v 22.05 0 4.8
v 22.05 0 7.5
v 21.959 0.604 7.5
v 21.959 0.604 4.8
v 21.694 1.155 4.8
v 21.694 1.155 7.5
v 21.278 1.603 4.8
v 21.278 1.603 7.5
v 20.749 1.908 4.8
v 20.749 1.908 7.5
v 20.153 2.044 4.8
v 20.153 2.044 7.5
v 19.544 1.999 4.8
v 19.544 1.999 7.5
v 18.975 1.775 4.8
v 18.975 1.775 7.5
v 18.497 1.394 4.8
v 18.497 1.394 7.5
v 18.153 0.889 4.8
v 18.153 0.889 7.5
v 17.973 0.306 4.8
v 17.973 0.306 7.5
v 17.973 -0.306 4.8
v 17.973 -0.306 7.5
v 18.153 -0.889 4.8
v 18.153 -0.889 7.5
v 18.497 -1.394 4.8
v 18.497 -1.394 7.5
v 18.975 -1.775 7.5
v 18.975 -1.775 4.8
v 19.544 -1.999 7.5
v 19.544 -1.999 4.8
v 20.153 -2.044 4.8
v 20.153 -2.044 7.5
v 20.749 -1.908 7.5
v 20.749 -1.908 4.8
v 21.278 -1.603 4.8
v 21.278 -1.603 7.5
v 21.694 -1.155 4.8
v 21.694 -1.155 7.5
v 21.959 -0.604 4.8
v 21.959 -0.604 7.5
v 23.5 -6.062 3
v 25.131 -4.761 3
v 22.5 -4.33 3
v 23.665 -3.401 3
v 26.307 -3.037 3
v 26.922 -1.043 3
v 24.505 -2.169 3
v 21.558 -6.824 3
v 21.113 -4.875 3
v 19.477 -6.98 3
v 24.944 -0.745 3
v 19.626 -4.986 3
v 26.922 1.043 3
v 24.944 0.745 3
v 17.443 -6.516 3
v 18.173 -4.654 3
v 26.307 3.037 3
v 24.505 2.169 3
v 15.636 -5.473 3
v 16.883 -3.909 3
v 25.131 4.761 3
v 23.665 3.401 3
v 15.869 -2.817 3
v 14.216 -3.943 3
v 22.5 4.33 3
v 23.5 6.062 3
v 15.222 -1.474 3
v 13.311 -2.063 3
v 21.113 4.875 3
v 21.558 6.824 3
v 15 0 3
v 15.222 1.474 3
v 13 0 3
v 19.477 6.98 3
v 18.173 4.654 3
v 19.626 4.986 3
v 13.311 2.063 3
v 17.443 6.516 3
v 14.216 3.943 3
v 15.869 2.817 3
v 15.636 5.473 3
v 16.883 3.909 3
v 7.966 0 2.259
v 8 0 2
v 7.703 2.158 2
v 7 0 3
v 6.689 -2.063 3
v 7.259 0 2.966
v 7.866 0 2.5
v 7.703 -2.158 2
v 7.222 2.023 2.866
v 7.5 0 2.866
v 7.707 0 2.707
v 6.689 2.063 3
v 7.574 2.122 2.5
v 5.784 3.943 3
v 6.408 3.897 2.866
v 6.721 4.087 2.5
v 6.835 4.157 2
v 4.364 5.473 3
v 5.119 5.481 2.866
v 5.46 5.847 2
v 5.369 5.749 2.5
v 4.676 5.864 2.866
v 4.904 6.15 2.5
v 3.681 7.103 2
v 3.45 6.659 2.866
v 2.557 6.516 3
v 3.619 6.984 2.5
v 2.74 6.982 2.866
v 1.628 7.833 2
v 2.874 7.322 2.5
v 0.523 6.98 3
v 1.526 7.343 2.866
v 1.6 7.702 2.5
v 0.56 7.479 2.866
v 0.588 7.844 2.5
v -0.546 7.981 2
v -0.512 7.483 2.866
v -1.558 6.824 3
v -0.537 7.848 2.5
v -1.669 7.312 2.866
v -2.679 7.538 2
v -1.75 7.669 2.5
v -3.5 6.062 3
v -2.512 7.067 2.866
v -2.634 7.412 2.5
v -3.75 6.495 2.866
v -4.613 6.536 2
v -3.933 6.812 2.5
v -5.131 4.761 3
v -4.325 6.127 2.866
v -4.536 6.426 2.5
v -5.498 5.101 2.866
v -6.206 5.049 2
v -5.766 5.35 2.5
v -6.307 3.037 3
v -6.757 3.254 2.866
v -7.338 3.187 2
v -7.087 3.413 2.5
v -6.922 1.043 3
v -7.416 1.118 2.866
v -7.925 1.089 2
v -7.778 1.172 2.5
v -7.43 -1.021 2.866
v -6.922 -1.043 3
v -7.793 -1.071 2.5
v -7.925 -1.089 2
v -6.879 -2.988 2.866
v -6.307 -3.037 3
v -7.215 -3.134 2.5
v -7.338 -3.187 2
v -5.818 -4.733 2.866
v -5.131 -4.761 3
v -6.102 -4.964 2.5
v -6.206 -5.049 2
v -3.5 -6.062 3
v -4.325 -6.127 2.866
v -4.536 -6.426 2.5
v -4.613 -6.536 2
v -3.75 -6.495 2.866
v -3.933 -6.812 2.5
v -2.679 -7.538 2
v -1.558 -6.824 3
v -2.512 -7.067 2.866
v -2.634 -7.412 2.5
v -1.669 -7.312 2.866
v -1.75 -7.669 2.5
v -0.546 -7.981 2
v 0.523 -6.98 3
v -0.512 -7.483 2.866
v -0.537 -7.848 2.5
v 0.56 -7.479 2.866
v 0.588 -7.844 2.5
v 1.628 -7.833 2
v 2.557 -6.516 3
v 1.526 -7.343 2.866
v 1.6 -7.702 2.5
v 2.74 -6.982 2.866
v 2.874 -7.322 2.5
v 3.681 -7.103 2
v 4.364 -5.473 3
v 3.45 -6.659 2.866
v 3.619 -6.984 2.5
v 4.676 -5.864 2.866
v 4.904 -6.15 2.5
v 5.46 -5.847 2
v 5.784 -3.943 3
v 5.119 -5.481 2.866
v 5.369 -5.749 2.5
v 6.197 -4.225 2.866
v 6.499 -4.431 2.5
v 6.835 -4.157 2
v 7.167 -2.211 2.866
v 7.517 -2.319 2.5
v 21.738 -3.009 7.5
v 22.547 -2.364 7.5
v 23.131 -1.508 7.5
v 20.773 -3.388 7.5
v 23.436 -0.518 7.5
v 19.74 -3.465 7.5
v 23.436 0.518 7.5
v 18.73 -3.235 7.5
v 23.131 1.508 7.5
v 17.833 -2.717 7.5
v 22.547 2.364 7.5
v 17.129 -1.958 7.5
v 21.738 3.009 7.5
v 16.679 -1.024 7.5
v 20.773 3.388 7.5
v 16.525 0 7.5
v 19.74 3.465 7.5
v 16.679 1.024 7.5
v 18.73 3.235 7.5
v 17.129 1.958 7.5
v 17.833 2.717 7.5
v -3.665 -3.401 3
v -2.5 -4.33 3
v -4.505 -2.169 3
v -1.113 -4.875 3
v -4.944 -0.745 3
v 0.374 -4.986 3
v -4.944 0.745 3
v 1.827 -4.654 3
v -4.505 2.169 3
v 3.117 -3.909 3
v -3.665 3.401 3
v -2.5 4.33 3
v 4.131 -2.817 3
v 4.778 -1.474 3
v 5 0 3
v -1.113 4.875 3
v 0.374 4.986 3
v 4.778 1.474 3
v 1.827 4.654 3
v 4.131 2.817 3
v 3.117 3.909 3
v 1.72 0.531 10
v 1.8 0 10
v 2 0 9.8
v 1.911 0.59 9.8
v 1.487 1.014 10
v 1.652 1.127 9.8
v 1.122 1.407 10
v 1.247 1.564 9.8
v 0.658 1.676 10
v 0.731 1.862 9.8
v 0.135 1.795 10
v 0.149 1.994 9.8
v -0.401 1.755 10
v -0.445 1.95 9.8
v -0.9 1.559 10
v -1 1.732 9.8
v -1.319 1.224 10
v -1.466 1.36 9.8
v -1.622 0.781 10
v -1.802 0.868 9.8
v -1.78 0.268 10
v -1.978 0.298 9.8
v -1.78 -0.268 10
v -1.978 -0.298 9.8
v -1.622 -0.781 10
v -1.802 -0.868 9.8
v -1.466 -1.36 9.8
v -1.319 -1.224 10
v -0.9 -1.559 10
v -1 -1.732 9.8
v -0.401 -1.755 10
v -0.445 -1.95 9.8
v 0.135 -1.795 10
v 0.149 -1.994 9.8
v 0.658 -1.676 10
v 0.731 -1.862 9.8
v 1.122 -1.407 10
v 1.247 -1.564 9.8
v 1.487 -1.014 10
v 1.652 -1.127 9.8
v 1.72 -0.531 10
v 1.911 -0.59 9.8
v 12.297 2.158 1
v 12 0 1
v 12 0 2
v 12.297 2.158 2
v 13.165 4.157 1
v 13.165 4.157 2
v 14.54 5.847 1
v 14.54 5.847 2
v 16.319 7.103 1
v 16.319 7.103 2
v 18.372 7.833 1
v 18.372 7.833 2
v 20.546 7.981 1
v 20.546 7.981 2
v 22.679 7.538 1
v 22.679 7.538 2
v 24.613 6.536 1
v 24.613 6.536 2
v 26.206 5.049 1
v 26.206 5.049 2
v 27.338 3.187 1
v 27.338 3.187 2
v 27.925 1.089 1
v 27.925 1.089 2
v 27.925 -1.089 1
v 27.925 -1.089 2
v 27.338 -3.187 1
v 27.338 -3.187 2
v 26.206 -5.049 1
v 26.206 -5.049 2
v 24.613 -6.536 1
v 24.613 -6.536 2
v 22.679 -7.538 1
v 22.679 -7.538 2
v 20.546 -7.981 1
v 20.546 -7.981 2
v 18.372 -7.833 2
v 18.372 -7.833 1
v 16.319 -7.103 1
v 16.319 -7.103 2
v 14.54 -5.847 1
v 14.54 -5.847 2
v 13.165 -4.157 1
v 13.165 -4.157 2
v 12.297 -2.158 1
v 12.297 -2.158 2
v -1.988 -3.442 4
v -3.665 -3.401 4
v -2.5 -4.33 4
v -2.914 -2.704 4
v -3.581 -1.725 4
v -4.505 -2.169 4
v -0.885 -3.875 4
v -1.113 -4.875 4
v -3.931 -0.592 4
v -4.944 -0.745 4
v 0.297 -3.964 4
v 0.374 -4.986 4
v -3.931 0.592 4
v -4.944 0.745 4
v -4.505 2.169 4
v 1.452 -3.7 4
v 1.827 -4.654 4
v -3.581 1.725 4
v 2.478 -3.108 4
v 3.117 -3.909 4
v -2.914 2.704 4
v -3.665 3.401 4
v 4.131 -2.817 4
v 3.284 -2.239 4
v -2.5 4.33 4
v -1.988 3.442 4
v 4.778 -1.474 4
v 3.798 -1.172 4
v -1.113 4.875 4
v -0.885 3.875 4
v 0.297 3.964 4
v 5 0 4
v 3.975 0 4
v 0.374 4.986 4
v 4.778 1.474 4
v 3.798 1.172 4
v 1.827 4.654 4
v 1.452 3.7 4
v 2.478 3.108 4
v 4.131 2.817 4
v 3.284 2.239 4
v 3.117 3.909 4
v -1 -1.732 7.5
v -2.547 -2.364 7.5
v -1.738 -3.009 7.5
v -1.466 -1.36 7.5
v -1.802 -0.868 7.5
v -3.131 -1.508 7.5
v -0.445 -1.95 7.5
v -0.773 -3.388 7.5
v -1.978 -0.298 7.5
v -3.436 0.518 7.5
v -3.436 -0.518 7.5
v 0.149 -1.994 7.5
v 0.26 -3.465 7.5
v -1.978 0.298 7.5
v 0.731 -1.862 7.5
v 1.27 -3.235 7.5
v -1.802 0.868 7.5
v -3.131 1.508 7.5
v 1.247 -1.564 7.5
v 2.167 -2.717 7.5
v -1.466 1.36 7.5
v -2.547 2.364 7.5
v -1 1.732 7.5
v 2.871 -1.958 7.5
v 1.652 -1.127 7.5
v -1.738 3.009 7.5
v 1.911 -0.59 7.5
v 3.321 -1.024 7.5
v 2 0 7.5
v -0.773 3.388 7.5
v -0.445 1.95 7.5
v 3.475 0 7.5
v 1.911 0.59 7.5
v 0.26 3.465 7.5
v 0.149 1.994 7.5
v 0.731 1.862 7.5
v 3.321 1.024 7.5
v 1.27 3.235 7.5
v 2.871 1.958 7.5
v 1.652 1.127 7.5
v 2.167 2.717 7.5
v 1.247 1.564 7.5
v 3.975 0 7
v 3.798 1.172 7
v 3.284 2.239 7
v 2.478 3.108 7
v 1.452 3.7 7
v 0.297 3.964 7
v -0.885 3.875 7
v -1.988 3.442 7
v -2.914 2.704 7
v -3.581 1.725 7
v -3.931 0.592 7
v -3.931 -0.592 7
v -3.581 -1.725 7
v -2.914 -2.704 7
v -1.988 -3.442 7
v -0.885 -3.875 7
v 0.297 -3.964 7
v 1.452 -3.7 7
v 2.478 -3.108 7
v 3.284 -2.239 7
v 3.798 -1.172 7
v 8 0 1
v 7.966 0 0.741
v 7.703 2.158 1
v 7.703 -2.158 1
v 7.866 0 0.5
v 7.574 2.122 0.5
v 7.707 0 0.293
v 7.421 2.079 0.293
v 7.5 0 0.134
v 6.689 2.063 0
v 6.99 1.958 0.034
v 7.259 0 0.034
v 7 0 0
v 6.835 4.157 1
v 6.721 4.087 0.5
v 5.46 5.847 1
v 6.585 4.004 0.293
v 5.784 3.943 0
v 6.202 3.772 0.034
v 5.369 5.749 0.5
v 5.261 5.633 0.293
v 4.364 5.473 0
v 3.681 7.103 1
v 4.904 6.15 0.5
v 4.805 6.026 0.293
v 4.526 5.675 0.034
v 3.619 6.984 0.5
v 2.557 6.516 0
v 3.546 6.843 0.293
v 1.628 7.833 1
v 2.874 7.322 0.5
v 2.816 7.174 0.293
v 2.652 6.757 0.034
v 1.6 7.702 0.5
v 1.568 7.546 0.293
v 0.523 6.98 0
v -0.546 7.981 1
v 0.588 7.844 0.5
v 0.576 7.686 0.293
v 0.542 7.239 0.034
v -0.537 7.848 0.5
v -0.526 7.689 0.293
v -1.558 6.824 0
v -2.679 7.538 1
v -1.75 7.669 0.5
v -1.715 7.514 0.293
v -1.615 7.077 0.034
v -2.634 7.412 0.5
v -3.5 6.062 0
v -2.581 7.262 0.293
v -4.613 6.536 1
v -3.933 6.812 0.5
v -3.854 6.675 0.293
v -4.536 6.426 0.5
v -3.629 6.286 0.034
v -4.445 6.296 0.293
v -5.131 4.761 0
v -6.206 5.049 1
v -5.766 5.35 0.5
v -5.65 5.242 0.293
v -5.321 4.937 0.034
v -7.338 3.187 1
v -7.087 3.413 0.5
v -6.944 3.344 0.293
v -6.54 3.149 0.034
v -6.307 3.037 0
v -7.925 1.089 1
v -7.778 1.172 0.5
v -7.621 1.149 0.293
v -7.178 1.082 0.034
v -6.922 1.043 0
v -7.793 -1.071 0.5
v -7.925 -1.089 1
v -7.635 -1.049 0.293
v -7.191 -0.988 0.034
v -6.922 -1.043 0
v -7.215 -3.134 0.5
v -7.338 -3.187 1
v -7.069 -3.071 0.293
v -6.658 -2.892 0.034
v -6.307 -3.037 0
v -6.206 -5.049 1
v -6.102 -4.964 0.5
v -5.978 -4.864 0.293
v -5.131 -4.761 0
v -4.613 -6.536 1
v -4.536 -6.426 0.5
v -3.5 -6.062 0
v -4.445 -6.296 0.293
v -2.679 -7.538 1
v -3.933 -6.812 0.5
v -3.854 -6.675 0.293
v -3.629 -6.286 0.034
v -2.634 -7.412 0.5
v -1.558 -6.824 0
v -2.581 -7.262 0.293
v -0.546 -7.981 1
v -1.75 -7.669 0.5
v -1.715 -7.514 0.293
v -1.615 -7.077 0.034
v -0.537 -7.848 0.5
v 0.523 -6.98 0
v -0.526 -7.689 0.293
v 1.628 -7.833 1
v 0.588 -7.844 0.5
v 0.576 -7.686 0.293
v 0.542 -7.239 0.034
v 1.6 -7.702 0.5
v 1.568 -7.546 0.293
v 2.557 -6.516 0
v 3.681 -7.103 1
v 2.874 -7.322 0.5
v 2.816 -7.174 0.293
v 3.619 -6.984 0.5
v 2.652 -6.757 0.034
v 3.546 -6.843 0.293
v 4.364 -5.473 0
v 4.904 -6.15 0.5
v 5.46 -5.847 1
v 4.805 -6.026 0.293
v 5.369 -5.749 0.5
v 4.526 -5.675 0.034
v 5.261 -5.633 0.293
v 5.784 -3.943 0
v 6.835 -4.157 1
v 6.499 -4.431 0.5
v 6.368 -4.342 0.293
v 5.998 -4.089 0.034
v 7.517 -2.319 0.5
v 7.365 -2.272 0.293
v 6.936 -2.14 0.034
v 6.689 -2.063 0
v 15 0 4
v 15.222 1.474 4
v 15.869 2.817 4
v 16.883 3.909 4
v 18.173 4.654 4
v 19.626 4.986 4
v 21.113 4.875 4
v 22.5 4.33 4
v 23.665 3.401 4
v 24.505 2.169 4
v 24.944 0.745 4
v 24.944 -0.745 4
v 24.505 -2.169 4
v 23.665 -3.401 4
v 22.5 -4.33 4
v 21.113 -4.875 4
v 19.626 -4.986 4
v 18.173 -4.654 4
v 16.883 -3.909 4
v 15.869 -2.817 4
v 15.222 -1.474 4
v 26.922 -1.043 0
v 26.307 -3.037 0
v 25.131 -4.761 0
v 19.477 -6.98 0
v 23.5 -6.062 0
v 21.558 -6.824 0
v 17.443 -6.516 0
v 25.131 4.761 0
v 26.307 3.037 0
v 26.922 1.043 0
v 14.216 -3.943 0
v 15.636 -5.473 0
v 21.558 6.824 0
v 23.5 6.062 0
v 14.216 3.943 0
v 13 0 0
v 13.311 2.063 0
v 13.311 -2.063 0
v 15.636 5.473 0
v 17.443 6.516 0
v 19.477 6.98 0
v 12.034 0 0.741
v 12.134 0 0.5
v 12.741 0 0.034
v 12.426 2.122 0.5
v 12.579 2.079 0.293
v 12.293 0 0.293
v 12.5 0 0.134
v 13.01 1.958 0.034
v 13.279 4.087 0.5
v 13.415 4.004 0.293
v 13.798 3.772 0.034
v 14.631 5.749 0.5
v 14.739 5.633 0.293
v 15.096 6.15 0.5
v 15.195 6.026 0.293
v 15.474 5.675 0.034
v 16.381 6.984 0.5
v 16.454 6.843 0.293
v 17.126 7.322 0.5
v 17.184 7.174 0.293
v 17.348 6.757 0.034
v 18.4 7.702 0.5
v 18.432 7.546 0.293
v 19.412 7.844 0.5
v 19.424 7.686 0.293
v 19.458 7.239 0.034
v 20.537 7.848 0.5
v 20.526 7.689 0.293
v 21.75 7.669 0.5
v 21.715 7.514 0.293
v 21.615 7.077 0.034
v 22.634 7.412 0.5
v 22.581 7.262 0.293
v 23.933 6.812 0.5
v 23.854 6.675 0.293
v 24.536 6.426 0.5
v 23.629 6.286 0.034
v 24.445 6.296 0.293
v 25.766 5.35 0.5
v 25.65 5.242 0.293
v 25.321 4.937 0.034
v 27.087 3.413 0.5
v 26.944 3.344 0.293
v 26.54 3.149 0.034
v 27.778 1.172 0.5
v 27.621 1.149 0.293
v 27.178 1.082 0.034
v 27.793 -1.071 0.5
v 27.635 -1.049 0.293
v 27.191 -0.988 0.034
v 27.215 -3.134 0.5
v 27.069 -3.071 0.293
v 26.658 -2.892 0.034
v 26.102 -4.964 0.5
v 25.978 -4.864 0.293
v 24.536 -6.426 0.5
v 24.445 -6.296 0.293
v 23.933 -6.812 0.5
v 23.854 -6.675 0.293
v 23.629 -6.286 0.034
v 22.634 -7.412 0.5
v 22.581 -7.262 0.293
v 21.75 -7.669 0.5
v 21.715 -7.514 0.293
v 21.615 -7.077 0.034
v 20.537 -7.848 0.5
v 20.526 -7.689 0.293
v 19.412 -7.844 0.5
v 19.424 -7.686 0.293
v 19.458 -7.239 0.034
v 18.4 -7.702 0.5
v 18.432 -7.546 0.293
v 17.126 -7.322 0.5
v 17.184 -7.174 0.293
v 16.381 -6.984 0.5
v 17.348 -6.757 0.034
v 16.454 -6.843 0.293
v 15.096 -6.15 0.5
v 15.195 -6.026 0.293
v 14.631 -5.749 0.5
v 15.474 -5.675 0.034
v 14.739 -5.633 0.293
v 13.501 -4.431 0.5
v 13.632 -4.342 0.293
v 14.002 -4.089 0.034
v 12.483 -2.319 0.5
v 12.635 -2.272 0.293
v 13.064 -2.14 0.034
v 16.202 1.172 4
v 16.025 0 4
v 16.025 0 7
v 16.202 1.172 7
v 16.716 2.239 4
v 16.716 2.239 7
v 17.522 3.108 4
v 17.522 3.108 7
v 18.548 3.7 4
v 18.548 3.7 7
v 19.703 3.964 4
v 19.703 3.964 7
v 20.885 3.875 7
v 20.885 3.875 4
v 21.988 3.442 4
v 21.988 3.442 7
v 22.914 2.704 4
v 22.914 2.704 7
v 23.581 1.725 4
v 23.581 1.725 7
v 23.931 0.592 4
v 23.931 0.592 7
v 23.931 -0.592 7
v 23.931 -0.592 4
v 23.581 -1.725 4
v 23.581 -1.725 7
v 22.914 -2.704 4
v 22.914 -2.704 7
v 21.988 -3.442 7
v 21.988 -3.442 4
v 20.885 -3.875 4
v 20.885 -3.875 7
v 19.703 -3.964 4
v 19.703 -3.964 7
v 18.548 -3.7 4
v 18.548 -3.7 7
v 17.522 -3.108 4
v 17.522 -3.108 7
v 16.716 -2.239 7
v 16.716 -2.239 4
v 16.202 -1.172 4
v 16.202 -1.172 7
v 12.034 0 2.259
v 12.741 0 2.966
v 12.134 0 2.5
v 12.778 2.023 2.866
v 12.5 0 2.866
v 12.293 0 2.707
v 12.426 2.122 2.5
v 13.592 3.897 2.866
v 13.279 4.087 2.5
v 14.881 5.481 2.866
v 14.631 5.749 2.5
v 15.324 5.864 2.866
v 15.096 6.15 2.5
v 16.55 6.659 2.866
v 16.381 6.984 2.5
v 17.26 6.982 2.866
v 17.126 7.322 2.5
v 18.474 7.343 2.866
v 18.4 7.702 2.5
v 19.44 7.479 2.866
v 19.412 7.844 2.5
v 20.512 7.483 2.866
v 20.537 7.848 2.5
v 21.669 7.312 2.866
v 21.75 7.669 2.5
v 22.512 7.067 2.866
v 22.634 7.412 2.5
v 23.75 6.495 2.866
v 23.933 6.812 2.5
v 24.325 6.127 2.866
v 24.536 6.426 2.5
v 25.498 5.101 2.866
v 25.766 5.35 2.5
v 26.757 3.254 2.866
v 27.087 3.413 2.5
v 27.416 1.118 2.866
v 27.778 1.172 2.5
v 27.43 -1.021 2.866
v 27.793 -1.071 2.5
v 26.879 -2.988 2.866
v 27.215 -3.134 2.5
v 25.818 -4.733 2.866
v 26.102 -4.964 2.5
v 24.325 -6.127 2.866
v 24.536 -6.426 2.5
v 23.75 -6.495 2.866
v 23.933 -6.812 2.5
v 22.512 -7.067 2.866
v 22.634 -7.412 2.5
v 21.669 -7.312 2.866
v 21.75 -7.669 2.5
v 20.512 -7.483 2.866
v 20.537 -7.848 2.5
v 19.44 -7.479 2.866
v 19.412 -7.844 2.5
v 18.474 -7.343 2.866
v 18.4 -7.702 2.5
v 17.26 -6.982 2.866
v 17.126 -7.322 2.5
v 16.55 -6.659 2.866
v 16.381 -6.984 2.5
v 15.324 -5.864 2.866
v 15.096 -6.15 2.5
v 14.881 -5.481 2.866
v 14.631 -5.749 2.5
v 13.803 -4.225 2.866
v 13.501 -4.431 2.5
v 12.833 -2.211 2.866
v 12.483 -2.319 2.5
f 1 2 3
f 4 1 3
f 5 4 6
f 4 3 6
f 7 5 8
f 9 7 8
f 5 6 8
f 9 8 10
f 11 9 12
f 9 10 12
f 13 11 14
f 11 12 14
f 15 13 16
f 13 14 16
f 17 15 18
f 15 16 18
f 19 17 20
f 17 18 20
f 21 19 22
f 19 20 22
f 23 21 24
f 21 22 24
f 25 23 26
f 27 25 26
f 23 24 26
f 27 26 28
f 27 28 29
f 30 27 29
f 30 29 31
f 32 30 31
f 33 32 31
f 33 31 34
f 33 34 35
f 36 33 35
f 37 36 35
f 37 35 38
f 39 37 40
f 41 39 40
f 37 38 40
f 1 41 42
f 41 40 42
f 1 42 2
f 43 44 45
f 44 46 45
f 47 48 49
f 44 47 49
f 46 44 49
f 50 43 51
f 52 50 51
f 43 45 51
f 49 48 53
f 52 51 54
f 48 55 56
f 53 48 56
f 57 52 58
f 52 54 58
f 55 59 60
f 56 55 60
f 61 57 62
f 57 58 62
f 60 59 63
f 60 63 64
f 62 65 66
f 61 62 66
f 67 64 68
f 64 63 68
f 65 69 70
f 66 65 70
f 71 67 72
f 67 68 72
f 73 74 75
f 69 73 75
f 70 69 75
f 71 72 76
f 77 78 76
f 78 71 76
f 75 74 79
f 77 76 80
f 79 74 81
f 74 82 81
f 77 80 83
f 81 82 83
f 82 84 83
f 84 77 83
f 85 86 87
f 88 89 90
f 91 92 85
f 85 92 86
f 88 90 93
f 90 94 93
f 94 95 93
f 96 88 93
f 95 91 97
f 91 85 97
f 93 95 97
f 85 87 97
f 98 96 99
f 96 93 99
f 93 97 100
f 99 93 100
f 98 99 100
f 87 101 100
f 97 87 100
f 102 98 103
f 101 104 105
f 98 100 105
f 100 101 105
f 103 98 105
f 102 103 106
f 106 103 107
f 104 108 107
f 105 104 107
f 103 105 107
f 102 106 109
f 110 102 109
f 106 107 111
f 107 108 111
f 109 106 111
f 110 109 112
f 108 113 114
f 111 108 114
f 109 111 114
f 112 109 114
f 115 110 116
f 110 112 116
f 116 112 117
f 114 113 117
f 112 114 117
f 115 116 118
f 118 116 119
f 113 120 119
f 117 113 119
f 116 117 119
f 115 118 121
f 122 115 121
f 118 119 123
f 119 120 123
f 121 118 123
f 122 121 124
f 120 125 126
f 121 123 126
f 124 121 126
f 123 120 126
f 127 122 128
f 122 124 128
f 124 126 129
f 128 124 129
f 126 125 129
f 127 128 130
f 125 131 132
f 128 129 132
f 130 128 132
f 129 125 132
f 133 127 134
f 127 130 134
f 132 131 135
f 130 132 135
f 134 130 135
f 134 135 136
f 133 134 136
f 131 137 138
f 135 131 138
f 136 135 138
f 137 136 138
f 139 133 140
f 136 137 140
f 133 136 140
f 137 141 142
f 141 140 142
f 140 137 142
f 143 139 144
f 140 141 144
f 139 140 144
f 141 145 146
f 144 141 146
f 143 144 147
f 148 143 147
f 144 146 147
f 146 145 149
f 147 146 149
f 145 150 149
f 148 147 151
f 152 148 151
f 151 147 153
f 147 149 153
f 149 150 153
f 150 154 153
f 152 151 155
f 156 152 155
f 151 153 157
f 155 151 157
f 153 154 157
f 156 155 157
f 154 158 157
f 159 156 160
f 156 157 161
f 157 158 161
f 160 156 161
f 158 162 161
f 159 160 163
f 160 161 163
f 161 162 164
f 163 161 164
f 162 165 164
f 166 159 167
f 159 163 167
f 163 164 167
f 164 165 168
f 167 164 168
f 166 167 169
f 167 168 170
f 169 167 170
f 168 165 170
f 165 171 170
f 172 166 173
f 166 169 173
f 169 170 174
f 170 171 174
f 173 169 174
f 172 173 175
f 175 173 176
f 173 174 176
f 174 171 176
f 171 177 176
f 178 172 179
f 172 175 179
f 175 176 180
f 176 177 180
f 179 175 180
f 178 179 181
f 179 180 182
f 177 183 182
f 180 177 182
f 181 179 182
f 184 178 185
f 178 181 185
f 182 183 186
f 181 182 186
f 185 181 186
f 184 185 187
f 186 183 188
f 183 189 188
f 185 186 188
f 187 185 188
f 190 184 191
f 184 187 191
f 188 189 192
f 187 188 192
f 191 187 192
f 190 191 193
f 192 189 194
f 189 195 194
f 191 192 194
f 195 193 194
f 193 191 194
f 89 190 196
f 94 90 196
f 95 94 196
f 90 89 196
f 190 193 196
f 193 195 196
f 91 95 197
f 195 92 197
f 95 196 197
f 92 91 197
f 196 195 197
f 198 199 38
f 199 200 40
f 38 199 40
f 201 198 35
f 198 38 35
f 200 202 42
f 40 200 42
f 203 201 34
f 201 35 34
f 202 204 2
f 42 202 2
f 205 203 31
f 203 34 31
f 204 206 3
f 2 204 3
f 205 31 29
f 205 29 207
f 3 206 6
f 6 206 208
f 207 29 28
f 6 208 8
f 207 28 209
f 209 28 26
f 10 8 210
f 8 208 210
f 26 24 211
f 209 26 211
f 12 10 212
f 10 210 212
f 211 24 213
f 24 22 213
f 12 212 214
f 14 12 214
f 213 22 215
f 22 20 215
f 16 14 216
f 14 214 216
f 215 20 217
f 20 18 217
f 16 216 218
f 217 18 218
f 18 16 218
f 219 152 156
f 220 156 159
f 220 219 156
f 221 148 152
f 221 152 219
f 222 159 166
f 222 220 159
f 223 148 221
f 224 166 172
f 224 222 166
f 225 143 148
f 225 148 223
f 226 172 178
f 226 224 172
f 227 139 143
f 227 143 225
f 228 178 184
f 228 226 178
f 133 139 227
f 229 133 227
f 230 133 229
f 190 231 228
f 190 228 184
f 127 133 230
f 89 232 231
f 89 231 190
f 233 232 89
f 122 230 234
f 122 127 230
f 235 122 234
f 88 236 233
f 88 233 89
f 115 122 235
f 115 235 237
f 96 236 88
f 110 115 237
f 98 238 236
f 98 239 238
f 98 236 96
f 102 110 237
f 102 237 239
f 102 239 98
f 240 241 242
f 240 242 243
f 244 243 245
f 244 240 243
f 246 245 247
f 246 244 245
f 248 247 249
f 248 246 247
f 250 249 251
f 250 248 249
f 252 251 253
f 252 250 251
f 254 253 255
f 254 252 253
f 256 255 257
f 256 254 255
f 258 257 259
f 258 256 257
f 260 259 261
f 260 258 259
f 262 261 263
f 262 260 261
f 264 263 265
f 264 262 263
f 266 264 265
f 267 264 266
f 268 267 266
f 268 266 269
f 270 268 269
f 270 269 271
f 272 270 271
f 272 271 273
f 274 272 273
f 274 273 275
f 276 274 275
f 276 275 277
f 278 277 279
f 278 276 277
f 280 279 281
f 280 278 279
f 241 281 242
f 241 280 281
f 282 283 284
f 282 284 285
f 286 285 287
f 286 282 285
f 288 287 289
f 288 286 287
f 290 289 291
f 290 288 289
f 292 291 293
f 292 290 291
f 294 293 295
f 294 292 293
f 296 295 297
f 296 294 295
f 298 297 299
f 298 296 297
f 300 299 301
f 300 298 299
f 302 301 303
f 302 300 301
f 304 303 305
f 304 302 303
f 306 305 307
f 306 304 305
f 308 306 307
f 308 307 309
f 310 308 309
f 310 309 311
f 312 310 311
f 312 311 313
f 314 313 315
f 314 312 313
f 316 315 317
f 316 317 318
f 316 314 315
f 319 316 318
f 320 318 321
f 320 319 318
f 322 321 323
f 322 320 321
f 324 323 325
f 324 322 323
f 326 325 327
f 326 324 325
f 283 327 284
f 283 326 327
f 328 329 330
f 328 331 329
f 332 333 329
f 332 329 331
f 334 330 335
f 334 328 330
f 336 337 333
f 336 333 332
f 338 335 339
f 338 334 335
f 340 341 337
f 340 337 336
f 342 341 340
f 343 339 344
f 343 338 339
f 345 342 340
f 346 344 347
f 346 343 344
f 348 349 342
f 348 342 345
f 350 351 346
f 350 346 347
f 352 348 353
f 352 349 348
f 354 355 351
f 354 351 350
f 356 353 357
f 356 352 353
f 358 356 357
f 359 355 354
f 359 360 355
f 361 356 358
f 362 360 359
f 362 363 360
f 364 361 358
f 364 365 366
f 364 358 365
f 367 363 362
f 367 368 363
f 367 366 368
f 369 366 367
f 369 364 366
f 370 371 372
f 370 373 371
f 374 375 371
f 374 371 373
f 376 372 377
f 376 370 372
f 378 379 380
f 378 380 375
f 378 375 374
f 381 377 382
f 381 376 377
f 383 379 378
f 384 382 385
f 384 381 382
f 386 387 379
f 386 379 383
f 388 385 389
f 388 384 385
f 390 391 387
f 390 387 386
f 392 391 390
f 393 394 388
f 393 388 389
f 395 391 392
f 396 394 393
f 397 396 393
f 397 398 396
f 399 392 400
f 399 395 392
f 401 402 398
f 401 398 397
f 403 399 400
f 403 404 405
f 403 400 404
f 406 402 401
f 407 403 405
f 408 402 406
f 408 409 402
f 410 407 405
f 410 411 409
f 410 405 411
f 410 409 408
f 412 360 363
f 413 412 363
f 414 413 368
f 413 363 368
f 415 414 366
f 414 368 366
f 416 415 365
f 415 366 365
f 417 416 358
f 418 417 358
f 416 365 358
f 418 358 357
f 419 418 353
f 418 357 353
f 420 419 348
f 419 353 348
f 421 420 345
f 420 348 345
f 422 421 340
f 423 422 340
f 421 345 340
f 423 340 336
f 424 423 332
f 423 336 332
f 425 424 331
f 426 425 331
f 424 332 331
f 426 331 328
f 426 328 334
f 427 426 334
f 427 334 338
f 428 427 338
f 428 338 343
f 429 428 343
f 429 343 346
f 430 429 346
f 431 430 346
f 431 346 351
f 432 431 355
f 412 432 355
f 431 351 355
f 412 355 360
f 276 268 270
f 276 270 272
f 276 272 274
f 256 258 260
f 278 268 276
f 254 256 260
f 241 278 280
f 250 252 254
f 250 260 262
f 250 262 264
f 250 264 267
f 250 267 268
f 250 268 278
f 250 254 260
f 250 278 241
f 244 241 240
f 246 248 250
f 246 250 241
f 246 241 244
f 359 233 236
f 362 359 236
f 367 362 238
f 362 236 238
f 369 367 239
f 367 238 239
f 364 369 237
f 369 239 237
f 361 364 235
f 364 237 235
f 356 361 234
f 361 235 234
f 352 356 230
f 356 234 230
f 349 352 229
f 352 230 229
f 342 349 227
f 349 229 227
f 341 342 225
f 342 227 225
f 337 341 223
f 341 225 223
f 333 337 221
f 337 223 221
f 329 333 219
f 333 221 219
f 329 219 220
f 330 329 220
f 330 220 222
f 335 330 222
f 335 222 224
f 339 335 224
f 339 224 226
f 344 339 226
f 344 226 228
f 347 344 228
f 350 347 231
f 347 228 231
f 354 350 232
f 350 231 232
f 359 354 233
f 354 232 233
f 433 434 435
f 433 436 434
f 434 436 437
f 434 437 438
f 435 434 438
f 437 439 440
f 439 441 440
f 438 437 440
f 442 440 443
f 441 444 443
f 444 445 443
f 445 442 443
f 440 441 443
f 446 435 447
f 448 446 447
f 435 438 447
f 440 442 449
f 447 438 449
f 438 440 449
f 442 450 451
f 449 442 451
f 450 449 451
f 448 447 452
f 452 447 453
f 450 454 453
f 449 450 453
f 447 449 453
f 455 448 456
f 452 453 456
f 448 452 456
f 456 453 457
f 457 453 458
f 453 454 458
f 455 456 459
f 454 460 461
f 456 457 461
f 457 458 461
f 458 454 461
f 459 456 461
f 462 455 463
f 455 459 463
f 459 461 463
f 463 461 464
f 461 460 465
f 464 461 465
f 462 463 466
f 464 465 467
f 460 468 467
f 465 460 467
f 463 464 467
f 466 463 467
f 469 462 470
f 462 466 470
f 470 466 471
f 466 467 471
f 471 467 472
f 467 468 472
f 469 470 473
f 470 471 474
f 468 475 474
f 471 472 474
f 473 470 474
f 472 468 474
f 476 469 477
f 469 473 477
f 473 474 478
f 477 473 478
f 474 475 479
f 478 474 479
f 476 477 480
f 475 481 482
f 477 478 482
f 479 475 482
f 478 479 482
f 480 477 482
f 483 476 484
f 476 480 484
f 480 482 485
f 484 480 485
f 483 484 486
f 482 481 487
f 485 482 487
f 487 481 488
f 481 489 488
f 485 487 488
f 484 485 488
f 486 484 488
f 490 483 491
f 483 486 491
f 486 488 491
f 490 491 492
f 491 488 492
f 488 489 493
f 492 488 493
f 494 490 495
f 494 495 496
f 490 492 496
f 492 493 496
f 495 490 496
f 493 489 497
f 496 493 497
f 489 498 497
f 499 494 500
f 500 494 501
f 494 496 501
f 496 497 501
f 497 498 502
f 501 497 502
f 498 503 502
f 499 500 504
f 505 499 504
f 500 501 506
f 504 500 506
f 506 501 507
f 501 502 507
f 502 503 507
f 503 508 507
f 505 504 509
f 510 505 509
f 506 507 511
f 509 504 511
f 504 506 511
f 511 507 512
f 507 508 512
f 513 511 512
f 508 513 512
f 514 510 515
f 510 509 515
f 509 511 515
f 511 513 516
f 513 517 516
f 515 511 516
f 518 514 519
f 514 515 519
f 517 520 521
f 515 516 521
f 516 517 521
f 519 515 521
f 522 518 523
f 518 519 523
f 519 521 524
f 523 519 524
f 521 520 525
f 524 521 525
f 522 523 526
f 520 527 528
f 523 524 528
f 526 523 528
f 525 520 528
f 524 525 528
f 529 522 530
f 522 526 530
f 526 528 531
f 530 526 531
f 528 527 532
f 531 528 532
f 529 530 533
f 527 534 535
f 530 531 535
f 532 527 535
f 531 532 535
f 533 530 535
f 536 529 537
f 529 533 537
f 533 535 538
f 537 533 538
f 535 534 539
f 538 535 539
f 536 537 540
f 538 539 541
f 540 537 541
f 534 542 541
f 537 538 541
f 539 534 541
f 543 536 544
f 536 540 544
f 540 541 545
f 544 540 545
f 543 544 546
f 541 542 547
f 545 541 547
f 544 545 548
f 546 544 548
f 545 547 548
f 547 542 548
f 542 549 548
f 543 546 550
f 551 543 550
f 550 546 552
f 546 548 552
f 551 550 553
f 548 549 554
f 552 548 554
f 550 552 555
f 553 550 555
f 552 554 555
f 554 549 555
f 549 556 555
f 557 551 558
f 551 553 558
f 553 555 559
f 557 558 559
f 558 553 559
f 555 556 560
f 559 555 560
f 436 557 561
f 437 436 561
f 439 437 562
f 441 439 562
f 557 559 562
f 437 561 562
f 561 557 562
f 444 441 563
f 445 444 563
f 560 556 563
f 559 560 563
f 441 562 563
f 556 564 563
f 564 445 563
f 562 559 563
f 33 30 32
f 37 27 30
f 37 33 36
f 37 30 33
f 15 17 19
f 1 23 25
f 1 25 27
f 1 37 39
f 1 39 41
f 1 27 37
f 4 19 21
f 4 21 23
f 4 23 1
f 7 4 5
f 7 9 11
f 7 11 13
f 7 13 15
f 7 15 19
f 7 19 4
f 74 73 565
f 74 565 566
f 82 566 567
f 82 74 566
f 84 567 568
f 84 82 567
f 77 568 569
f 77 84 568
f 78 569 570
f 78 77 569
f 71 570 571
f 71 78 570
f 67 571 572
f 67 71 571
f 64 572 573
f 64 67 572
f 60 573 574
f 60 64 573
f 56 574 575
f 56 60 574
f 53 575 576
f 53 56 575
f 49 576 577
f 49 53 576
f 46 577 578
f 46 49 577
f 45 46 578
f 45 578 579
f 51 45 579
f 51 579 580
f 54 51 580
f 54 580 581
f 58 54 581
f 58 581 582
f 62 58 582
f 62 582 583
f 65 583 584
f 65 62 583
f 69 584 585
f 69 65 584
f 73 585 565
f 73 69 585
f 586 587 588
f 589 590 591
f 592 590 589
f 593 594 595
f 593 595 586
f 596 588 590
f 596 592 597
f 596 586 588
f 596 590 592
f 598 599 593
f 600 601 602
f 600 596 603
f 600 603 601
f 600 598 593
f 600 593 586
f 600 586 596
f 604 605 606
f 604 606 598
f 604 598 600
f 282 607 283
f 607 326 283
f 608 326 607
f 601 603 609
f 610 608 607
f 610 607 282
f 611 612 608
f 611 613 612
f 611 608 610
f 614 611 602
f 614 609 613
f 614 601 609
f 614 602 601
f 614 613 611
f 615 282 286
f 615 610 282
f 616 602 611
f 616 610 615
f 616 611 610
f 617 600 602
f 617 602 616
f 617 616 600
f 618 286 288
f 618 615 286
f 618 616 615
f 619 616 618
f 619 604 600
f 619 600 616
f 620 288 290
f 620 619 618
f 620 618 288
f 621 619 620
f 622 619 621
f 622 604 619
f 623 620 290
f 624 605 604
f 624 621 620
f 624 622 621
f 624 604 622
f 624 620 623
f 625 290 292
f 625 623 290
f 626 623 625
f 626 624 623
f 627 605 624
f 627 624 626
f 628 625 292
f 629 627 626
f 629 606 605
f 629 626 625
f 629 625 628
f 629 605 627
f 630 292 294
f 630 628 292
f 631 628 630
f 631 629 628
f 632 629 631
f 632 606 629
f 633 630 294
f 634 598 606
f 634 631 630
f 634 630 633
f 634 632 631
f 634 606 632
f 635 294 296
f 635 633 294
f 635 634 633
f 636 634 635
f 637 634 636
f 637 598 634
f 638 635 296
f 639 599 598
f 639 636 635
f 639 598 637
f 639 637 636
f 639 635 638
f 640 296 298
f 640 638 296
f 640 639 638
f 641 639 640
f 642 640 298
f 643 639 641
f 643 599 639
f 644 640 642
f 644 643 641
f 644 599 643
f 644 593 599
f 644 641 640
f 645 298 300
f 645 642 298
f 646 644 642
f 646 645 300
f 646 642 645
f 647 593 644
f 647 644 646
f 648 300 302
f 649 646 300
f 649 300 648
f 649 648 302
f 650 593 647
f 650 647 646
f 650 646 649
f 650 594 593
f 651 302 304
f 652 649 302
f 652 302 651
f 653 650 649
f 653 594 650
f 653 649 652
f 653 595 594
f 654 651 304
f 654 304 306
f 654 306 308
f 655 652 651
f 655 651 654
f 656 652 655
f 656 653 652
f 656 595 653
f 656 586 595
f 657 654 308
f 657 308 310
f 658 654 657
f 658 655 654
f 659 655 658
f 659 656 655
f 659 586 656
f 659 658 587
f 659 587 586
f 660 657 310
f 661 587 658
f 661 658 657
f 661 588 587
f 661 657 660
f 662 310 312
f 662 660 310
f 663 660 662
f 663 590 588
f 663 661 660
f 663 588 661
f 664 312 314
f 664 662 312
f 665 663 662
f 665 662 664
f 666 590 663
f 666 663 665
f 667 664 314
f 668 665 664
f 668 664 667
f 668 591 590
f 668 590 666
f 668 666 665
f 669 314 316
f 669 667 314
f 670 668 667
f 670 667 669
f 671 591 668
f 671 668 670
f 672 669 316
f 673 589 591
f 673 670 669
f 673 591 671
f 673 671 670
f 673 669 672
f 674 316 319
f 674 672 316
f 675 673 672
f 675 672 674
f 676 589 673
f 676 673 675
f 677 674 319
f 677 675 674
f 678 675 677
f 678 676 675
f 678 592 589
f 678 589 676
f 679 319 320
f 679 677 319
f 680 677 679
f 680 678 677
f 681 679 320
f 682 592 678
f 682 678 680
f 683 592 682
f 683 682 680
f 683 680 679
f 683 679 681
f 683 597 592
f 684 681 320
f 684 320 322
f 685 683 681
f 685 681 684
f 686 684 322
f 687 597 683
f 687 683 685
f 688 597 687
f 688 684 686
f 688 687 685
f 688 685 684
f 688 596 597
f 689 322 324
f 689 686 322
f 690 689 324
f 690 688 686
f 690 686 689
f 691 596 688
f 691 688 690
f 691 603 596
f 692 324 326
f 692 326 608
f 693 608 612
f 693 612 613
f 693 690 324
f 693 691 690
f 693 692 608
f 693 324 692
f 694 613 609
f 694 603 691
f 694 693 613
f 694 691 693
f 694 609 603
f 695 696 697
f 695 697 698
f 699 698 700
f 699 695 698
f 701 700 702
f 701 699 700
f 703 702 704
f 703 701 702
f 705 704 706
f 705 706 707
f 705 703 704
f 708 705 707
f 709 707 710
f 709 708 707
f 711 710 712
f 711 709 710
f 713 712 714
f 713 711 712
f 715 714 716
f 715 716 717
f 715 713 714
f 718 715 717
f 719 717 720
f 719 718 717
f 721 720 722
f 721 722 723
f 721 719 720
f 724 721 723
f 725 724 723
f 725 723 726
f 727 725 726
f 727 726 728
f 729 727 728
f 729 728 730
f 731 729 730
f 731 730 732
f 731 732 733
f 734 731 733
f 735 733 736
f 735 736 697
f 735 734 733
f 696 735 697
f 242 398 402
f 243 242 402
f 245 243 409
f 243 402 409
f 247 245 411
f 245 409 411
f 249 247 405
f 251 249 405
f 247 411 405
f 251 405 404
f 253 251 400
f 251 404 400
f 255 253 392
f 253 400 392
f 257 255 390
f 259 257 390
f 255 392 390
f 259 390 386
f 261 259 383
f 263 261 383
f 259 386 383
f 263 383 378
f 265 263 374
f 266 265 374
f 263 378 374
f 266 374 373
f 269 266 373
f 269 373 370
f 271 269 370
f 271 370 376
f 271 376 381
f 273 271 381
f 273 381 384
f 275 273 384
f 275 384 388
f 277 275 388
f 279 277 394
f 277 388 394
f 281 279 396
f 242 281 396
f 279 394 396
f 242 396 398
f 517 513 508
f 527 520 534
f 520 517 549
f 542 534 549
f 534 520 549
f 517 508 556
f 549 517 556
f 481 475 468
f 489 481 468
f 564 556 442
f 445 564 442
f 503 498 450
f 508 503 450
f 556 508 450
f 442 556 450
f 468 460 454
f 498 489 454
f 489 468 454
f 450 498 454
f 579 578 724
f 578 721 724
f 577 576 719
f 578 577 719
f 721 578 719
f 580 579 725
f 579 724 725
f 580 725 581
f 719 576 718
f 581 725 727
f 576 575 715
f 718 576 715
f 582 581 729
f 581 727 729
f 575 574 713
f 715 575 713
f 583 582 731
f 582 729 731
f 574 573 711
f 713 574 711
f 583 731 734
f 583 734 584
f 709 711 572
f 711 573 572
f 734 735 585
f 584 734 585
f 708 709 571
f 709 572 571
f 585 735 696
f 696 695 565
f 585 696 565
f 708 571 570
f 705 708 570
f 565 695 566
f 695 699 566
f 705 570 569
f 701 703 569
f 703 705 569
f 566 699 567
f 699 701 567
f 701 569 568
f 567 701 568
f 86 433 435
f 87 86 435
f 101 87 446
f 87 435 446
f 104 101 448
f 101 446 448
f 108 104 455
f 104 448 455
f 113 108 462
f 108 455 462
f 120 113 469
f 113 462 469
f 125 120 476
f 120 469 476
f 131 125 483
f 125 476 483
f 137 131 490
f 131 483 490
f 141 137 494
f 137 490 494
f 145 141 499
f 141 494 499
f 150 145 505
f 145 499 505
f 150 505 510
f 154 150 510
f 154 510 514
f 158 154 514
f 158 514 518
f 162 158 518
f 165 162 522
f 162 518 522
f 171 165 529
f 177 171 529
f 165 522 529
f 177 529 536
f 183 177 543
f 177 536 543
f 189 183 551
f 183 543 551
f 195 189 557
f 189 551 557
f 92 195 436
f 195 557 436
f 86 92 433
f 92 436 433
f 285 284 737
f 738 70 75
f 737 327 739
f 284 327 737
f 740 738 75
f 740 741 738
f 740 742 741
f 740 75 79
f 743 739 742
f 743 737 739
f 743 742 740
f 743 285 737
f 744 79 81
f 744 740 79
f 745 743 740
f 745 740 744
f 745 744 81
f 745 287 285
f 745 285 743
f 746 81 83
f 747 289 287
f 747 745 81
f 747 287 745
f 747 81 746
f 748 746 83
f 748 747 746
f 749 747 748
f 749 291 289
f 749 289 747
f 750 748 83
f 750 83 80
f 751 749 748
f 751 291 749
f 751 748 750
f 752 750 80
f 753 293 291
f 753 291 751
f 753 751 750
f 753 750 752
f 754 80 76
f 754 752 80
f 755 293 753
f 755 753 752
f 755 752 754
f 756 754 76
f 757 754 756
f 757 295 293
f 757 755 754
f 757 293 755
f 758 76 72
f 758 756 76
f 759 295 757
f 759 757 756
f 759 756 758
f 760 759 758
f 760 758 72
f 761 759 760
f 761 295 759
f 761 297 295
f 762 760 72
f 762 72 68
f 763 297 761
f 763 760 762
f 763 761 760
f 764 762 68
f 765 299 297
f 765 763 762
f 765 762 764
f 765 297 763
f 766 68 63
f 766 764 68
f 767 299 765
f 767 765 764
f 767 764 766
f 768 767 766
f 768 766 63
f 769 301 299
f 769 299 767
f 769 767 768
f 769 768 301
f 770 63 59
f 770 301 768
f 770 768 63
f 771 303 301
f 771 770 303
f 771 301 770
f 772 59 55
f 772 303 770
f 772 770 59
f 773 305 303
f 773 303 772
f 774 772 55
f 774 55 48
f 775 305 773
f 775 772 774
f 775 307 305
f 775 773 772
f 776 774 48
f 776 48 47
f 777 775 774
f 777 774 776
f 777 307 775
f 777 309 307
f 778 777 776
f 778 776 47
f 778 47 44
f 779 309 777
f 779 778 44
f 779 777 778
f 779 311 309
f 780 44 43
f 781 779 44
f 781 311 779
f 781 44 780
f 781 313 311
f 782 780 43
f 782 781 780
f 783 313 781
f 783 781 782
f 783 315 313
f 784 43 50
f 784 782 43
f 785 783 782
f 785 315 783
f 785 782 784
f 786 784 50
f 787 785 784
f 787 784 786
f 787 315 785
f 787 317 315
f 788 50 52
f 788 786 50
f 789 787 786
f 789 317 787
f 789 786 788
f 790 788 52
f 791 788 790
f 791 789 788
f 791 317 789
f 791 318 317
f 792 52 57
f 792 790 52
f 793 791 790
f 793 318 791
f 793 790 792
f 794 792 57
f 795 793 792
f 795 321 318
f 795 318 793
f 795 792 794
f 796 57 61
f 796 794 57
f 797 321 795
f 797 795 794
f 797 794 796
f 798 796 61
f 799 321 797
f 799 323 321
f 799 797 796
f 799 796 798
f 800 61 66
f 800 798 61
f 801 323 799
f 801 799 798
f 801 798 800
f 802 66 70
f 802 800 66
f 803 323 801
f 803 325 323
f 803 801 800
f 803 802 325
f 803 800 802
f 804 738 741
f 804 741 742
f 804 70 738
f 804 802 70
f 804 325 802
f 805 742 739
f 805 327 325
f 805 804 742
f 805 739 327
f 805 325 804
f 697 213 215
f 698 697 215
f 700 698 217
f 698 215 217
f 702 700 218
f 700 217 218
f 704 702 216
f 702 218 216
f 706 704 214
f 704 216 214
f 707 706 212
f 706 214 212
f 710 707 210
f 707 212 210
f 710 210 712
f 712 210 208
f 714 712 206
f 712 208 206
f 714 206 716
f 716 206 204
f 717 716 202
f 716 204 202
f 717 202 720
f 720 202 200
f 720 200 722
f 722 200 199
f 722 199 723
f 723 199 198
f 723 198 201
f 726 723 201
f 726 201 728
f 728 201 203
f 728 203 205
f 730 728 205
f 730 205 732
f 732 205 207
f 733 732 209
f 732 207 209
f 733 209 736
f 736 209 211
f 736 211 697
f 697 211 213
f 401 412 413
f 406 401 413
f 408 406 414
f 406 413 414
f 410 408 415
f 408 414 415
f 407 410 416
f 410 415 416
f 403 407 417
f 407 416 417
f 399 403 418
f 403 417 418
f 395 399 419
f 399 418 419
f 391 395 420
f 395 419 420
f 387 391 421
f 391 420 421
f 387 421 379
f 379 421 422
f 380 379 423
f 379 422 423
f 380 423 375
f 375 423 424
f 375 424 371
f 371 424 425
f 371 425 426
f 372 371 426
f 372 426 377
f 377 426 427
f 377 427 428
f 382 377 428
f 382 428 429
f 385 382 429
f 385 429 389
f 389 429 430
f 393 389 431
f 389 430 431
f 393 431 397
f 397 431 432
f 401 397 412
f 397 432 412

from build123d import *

# Parameters (mm, degrees)
F0_R       = 8
F1_DEPTH   = 3
F2_R       = 5
F3_DEPTH   = 1
F4_R       = 3.975
F5_DEPTH   = 3.5
F8_R       = 2
F9_DEPTH   = 2.5
F10_R      = 2.05
F11_DEPTH  = 2.7
F12_SIZE   = 0.2
F13_SIZE   = 0.5
F13_2_SIZE = 0.5
F14_R      = 1
F14_2_R    = 1


with BuildPart() as f1:
    # F0 (on Top) → F1 (new body)
    with BuildSketch(Plane.XY):
        Circle(F0_R)
    extrude(amount=F1_DEPTH)

    # F2 (on face) → F3 (join)
    with BuildSketch(Plane.XY.offset(3)):
        Circle(F2_R)
    extrude(amount=F3_DEPTH)

    # F4 (on face) → F5 (join)
    with BuildSketch(Plane.XY.offset(4)):
        Circle(F4_R)
    extrude(amount=F5_DEPTH)


with BuildPart() as f7_1:
    # F7: instance of F1
    add(f1.part.mirror(Plane.YZ.offset(10)))

    # F10 (on face) → F11 (cut)
    with BuildSketch(Plane.XY.offset(7.5)):
        with Locations((20, 0)):
            Circle(F10_R)
    extrude(amount=-F11_DEPTH, mode=Mode.SUBTRACT)

    # F13#2
    f13_2_edges = [f7_1.edges().sort_by_distance(p)[0] for p in [
        (23.975, 0, 7.5),
    ]]
    chamfer(f13_2_edges, length=F13_2_SIZE)

    # F14#2
    f14_2_edges = [f7_1.edges().sort_by_distance(p)[0] for p in [
        (28, 0, 3),
        (28, 0, 0),
    ]]
    fillet(f14_2_edges, radius=F14_2_R)


with BuildPart() as f1_1:
    add(f1.part)

    # F8 (on face) → F9 (join)
    with BuildSketch(Plane.XY.offset(7.5)):
        Circle(F8_R)
    extrude(amount=F9_DEPTH)

    # F12
    f12_edges = [f1_1.edges().sort_by_distance(p)[0] for p in [
        (-2, 0, 10),
    ]]
    chamfer(f12_edges, length=F12_SIZE)

    # F13
    f13_edges = [f1_1.edges().sort_by_distance(p)[0] for p in [
        (-3.975, 0, 7.5),
    ]]
    chamfer(f13_edges, length=F13_SIZE)

    # F14
    f14_edges = [f1_1.edges().sort_by_distance(p)[0] for p in [
        (-8, 0, 3),
        (-8, 0, 0),
    ]]
    fillet(f14_edges, radius=F14_R)


solid = Compound([f7_1.part, f1_1.part])
